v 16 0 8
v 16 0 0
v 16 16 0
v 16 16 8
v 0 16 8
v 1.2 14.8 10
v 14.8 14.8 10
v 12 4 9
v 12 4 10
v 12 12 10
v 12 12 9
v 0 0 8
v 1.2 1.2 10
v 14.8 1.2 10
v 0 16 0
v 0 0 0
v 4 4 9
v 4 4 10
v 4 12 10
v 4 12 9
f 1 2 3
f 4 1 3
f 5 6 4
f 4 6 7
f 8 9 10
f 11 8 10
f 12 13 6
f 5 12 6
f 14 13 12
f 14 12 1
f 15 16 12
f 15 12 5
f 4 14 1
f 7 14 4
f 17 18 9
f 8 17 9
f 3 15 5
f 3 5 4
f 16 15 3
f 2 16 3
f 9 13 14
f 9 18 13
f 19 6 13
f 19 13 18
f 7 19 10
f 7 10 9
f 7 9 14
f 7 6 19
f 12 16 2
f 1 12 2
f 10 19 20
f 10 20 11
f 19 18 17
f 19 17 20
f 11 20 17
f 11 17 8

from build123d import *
from OCP.BRepFilletAPI import BRepFilletAPI_MakeChamfer

# Parameters (mm, degrees)
SKETCH1_W           = 16
SKETCH1_H           = 16
BOSS_EXTRUDE1_DEPTH = 10
SKETCH2_W           = 8
SKETCH2_H           = 8
CUT_EXTRUDE1_DEPTH  = 1
FILLET4_SIZE        = 2
FILLET4_SIZE2       = 1.2


with BuildPart() as part:
    # Sketch1 → Boss-Extrude1 (new body)
    with BuildSketch(Plane.XY):
        with Locations((8, 8)):
            Rectangle(SKETCH1_W, SKETCH1_H)
    extrude(amount=BOSS_EXTRUDE1_DEPTH)

    # Sketch2 → Cut-Extrude1 (cut)
    with BuildSketch(Plane.XY.offset(10)):
        with Locations((8, 8)):
            Rectangle(SKETCH2_W, SKETCH2_H)
    extrude(amount=-CUT_EXTRUDE1_DEPTH, mode=Mode.SUBTRACT)

    # Fillet4: one chamfer whose edges measure the first distance from different faces: ONE call of the kernel's chamfer builder (chamfer() names one face for all edges)
    fillet4_edges_1 = [part.edges().sort_by_distance(p)[0] for p in [
        (16, 8, 10),
    ]]
    fillet4_side_1 = [part.faces().sort_by_distance(p)[0] for p in [
        (16, 8, 5),
    ]]
    fillet4_edges_2 = [part.edges().sort_by_distance(p)[0] for p in [
        (8, 16, 10),
    ]]
    fillet4_side_2 = [part.faces().sort_by_distance(p)[0] for p in [
        (8, 16, 5),
    ]]
    fillet4_edges_3 = [part.edges().sort_by_distance(p)[0] for p in [
        (0, 8, 10),
    ]]
    fillet4_side_3 = [part.faces().sort_by_distance(p)[0] for p in [
        (0, 8, 5),
    ]]
    fillet4_edges_4 = [part.edges().sort_by_distance(p)[0] for p in [
        (8, 0, 10),
    ]]
    fillet4_side_4 = [part.faces().sort_by_distance(p)[0] for p in [
        (8, 0, 5),
    ]]
    fillet4 = BRepFilletAPI_MakeChamfer(part.part.solid().wrapped)
    for e in fillet4_edges_1:
        fillet4.Add(FILLET4_SIZE, FILLET4_SIZE2, e.wrapped, fillet4_side_1[0].wrapped)  # the first distance lies on this face
    for e in fillet4_edges_2:
        fillet4.Add(FILLET4_SIZE, FILLET4_SIZE2, e.wrapped, fillet4_side_2[0].wrapped)  # the first distance lies on this face
    for e in fillet4_edges_3:
        fillet4.Add(FILLET4_SIZE, FILLET4_SIZE2, e.wrapped, fillet4_side_3[0].wrapped)  # the first distance lies on this face
    for e in fillet4_edges_4:
        fillet4.Add(FILLET4_SIZE, FILLET4_SIZE2, e.wrapped, fillet4_side_4[0].wrapped)  # the first distance lies on this face
    add(Compound.cast(fillet4.Shape()), mode=Mode.REPLACE)


solid = part.part
